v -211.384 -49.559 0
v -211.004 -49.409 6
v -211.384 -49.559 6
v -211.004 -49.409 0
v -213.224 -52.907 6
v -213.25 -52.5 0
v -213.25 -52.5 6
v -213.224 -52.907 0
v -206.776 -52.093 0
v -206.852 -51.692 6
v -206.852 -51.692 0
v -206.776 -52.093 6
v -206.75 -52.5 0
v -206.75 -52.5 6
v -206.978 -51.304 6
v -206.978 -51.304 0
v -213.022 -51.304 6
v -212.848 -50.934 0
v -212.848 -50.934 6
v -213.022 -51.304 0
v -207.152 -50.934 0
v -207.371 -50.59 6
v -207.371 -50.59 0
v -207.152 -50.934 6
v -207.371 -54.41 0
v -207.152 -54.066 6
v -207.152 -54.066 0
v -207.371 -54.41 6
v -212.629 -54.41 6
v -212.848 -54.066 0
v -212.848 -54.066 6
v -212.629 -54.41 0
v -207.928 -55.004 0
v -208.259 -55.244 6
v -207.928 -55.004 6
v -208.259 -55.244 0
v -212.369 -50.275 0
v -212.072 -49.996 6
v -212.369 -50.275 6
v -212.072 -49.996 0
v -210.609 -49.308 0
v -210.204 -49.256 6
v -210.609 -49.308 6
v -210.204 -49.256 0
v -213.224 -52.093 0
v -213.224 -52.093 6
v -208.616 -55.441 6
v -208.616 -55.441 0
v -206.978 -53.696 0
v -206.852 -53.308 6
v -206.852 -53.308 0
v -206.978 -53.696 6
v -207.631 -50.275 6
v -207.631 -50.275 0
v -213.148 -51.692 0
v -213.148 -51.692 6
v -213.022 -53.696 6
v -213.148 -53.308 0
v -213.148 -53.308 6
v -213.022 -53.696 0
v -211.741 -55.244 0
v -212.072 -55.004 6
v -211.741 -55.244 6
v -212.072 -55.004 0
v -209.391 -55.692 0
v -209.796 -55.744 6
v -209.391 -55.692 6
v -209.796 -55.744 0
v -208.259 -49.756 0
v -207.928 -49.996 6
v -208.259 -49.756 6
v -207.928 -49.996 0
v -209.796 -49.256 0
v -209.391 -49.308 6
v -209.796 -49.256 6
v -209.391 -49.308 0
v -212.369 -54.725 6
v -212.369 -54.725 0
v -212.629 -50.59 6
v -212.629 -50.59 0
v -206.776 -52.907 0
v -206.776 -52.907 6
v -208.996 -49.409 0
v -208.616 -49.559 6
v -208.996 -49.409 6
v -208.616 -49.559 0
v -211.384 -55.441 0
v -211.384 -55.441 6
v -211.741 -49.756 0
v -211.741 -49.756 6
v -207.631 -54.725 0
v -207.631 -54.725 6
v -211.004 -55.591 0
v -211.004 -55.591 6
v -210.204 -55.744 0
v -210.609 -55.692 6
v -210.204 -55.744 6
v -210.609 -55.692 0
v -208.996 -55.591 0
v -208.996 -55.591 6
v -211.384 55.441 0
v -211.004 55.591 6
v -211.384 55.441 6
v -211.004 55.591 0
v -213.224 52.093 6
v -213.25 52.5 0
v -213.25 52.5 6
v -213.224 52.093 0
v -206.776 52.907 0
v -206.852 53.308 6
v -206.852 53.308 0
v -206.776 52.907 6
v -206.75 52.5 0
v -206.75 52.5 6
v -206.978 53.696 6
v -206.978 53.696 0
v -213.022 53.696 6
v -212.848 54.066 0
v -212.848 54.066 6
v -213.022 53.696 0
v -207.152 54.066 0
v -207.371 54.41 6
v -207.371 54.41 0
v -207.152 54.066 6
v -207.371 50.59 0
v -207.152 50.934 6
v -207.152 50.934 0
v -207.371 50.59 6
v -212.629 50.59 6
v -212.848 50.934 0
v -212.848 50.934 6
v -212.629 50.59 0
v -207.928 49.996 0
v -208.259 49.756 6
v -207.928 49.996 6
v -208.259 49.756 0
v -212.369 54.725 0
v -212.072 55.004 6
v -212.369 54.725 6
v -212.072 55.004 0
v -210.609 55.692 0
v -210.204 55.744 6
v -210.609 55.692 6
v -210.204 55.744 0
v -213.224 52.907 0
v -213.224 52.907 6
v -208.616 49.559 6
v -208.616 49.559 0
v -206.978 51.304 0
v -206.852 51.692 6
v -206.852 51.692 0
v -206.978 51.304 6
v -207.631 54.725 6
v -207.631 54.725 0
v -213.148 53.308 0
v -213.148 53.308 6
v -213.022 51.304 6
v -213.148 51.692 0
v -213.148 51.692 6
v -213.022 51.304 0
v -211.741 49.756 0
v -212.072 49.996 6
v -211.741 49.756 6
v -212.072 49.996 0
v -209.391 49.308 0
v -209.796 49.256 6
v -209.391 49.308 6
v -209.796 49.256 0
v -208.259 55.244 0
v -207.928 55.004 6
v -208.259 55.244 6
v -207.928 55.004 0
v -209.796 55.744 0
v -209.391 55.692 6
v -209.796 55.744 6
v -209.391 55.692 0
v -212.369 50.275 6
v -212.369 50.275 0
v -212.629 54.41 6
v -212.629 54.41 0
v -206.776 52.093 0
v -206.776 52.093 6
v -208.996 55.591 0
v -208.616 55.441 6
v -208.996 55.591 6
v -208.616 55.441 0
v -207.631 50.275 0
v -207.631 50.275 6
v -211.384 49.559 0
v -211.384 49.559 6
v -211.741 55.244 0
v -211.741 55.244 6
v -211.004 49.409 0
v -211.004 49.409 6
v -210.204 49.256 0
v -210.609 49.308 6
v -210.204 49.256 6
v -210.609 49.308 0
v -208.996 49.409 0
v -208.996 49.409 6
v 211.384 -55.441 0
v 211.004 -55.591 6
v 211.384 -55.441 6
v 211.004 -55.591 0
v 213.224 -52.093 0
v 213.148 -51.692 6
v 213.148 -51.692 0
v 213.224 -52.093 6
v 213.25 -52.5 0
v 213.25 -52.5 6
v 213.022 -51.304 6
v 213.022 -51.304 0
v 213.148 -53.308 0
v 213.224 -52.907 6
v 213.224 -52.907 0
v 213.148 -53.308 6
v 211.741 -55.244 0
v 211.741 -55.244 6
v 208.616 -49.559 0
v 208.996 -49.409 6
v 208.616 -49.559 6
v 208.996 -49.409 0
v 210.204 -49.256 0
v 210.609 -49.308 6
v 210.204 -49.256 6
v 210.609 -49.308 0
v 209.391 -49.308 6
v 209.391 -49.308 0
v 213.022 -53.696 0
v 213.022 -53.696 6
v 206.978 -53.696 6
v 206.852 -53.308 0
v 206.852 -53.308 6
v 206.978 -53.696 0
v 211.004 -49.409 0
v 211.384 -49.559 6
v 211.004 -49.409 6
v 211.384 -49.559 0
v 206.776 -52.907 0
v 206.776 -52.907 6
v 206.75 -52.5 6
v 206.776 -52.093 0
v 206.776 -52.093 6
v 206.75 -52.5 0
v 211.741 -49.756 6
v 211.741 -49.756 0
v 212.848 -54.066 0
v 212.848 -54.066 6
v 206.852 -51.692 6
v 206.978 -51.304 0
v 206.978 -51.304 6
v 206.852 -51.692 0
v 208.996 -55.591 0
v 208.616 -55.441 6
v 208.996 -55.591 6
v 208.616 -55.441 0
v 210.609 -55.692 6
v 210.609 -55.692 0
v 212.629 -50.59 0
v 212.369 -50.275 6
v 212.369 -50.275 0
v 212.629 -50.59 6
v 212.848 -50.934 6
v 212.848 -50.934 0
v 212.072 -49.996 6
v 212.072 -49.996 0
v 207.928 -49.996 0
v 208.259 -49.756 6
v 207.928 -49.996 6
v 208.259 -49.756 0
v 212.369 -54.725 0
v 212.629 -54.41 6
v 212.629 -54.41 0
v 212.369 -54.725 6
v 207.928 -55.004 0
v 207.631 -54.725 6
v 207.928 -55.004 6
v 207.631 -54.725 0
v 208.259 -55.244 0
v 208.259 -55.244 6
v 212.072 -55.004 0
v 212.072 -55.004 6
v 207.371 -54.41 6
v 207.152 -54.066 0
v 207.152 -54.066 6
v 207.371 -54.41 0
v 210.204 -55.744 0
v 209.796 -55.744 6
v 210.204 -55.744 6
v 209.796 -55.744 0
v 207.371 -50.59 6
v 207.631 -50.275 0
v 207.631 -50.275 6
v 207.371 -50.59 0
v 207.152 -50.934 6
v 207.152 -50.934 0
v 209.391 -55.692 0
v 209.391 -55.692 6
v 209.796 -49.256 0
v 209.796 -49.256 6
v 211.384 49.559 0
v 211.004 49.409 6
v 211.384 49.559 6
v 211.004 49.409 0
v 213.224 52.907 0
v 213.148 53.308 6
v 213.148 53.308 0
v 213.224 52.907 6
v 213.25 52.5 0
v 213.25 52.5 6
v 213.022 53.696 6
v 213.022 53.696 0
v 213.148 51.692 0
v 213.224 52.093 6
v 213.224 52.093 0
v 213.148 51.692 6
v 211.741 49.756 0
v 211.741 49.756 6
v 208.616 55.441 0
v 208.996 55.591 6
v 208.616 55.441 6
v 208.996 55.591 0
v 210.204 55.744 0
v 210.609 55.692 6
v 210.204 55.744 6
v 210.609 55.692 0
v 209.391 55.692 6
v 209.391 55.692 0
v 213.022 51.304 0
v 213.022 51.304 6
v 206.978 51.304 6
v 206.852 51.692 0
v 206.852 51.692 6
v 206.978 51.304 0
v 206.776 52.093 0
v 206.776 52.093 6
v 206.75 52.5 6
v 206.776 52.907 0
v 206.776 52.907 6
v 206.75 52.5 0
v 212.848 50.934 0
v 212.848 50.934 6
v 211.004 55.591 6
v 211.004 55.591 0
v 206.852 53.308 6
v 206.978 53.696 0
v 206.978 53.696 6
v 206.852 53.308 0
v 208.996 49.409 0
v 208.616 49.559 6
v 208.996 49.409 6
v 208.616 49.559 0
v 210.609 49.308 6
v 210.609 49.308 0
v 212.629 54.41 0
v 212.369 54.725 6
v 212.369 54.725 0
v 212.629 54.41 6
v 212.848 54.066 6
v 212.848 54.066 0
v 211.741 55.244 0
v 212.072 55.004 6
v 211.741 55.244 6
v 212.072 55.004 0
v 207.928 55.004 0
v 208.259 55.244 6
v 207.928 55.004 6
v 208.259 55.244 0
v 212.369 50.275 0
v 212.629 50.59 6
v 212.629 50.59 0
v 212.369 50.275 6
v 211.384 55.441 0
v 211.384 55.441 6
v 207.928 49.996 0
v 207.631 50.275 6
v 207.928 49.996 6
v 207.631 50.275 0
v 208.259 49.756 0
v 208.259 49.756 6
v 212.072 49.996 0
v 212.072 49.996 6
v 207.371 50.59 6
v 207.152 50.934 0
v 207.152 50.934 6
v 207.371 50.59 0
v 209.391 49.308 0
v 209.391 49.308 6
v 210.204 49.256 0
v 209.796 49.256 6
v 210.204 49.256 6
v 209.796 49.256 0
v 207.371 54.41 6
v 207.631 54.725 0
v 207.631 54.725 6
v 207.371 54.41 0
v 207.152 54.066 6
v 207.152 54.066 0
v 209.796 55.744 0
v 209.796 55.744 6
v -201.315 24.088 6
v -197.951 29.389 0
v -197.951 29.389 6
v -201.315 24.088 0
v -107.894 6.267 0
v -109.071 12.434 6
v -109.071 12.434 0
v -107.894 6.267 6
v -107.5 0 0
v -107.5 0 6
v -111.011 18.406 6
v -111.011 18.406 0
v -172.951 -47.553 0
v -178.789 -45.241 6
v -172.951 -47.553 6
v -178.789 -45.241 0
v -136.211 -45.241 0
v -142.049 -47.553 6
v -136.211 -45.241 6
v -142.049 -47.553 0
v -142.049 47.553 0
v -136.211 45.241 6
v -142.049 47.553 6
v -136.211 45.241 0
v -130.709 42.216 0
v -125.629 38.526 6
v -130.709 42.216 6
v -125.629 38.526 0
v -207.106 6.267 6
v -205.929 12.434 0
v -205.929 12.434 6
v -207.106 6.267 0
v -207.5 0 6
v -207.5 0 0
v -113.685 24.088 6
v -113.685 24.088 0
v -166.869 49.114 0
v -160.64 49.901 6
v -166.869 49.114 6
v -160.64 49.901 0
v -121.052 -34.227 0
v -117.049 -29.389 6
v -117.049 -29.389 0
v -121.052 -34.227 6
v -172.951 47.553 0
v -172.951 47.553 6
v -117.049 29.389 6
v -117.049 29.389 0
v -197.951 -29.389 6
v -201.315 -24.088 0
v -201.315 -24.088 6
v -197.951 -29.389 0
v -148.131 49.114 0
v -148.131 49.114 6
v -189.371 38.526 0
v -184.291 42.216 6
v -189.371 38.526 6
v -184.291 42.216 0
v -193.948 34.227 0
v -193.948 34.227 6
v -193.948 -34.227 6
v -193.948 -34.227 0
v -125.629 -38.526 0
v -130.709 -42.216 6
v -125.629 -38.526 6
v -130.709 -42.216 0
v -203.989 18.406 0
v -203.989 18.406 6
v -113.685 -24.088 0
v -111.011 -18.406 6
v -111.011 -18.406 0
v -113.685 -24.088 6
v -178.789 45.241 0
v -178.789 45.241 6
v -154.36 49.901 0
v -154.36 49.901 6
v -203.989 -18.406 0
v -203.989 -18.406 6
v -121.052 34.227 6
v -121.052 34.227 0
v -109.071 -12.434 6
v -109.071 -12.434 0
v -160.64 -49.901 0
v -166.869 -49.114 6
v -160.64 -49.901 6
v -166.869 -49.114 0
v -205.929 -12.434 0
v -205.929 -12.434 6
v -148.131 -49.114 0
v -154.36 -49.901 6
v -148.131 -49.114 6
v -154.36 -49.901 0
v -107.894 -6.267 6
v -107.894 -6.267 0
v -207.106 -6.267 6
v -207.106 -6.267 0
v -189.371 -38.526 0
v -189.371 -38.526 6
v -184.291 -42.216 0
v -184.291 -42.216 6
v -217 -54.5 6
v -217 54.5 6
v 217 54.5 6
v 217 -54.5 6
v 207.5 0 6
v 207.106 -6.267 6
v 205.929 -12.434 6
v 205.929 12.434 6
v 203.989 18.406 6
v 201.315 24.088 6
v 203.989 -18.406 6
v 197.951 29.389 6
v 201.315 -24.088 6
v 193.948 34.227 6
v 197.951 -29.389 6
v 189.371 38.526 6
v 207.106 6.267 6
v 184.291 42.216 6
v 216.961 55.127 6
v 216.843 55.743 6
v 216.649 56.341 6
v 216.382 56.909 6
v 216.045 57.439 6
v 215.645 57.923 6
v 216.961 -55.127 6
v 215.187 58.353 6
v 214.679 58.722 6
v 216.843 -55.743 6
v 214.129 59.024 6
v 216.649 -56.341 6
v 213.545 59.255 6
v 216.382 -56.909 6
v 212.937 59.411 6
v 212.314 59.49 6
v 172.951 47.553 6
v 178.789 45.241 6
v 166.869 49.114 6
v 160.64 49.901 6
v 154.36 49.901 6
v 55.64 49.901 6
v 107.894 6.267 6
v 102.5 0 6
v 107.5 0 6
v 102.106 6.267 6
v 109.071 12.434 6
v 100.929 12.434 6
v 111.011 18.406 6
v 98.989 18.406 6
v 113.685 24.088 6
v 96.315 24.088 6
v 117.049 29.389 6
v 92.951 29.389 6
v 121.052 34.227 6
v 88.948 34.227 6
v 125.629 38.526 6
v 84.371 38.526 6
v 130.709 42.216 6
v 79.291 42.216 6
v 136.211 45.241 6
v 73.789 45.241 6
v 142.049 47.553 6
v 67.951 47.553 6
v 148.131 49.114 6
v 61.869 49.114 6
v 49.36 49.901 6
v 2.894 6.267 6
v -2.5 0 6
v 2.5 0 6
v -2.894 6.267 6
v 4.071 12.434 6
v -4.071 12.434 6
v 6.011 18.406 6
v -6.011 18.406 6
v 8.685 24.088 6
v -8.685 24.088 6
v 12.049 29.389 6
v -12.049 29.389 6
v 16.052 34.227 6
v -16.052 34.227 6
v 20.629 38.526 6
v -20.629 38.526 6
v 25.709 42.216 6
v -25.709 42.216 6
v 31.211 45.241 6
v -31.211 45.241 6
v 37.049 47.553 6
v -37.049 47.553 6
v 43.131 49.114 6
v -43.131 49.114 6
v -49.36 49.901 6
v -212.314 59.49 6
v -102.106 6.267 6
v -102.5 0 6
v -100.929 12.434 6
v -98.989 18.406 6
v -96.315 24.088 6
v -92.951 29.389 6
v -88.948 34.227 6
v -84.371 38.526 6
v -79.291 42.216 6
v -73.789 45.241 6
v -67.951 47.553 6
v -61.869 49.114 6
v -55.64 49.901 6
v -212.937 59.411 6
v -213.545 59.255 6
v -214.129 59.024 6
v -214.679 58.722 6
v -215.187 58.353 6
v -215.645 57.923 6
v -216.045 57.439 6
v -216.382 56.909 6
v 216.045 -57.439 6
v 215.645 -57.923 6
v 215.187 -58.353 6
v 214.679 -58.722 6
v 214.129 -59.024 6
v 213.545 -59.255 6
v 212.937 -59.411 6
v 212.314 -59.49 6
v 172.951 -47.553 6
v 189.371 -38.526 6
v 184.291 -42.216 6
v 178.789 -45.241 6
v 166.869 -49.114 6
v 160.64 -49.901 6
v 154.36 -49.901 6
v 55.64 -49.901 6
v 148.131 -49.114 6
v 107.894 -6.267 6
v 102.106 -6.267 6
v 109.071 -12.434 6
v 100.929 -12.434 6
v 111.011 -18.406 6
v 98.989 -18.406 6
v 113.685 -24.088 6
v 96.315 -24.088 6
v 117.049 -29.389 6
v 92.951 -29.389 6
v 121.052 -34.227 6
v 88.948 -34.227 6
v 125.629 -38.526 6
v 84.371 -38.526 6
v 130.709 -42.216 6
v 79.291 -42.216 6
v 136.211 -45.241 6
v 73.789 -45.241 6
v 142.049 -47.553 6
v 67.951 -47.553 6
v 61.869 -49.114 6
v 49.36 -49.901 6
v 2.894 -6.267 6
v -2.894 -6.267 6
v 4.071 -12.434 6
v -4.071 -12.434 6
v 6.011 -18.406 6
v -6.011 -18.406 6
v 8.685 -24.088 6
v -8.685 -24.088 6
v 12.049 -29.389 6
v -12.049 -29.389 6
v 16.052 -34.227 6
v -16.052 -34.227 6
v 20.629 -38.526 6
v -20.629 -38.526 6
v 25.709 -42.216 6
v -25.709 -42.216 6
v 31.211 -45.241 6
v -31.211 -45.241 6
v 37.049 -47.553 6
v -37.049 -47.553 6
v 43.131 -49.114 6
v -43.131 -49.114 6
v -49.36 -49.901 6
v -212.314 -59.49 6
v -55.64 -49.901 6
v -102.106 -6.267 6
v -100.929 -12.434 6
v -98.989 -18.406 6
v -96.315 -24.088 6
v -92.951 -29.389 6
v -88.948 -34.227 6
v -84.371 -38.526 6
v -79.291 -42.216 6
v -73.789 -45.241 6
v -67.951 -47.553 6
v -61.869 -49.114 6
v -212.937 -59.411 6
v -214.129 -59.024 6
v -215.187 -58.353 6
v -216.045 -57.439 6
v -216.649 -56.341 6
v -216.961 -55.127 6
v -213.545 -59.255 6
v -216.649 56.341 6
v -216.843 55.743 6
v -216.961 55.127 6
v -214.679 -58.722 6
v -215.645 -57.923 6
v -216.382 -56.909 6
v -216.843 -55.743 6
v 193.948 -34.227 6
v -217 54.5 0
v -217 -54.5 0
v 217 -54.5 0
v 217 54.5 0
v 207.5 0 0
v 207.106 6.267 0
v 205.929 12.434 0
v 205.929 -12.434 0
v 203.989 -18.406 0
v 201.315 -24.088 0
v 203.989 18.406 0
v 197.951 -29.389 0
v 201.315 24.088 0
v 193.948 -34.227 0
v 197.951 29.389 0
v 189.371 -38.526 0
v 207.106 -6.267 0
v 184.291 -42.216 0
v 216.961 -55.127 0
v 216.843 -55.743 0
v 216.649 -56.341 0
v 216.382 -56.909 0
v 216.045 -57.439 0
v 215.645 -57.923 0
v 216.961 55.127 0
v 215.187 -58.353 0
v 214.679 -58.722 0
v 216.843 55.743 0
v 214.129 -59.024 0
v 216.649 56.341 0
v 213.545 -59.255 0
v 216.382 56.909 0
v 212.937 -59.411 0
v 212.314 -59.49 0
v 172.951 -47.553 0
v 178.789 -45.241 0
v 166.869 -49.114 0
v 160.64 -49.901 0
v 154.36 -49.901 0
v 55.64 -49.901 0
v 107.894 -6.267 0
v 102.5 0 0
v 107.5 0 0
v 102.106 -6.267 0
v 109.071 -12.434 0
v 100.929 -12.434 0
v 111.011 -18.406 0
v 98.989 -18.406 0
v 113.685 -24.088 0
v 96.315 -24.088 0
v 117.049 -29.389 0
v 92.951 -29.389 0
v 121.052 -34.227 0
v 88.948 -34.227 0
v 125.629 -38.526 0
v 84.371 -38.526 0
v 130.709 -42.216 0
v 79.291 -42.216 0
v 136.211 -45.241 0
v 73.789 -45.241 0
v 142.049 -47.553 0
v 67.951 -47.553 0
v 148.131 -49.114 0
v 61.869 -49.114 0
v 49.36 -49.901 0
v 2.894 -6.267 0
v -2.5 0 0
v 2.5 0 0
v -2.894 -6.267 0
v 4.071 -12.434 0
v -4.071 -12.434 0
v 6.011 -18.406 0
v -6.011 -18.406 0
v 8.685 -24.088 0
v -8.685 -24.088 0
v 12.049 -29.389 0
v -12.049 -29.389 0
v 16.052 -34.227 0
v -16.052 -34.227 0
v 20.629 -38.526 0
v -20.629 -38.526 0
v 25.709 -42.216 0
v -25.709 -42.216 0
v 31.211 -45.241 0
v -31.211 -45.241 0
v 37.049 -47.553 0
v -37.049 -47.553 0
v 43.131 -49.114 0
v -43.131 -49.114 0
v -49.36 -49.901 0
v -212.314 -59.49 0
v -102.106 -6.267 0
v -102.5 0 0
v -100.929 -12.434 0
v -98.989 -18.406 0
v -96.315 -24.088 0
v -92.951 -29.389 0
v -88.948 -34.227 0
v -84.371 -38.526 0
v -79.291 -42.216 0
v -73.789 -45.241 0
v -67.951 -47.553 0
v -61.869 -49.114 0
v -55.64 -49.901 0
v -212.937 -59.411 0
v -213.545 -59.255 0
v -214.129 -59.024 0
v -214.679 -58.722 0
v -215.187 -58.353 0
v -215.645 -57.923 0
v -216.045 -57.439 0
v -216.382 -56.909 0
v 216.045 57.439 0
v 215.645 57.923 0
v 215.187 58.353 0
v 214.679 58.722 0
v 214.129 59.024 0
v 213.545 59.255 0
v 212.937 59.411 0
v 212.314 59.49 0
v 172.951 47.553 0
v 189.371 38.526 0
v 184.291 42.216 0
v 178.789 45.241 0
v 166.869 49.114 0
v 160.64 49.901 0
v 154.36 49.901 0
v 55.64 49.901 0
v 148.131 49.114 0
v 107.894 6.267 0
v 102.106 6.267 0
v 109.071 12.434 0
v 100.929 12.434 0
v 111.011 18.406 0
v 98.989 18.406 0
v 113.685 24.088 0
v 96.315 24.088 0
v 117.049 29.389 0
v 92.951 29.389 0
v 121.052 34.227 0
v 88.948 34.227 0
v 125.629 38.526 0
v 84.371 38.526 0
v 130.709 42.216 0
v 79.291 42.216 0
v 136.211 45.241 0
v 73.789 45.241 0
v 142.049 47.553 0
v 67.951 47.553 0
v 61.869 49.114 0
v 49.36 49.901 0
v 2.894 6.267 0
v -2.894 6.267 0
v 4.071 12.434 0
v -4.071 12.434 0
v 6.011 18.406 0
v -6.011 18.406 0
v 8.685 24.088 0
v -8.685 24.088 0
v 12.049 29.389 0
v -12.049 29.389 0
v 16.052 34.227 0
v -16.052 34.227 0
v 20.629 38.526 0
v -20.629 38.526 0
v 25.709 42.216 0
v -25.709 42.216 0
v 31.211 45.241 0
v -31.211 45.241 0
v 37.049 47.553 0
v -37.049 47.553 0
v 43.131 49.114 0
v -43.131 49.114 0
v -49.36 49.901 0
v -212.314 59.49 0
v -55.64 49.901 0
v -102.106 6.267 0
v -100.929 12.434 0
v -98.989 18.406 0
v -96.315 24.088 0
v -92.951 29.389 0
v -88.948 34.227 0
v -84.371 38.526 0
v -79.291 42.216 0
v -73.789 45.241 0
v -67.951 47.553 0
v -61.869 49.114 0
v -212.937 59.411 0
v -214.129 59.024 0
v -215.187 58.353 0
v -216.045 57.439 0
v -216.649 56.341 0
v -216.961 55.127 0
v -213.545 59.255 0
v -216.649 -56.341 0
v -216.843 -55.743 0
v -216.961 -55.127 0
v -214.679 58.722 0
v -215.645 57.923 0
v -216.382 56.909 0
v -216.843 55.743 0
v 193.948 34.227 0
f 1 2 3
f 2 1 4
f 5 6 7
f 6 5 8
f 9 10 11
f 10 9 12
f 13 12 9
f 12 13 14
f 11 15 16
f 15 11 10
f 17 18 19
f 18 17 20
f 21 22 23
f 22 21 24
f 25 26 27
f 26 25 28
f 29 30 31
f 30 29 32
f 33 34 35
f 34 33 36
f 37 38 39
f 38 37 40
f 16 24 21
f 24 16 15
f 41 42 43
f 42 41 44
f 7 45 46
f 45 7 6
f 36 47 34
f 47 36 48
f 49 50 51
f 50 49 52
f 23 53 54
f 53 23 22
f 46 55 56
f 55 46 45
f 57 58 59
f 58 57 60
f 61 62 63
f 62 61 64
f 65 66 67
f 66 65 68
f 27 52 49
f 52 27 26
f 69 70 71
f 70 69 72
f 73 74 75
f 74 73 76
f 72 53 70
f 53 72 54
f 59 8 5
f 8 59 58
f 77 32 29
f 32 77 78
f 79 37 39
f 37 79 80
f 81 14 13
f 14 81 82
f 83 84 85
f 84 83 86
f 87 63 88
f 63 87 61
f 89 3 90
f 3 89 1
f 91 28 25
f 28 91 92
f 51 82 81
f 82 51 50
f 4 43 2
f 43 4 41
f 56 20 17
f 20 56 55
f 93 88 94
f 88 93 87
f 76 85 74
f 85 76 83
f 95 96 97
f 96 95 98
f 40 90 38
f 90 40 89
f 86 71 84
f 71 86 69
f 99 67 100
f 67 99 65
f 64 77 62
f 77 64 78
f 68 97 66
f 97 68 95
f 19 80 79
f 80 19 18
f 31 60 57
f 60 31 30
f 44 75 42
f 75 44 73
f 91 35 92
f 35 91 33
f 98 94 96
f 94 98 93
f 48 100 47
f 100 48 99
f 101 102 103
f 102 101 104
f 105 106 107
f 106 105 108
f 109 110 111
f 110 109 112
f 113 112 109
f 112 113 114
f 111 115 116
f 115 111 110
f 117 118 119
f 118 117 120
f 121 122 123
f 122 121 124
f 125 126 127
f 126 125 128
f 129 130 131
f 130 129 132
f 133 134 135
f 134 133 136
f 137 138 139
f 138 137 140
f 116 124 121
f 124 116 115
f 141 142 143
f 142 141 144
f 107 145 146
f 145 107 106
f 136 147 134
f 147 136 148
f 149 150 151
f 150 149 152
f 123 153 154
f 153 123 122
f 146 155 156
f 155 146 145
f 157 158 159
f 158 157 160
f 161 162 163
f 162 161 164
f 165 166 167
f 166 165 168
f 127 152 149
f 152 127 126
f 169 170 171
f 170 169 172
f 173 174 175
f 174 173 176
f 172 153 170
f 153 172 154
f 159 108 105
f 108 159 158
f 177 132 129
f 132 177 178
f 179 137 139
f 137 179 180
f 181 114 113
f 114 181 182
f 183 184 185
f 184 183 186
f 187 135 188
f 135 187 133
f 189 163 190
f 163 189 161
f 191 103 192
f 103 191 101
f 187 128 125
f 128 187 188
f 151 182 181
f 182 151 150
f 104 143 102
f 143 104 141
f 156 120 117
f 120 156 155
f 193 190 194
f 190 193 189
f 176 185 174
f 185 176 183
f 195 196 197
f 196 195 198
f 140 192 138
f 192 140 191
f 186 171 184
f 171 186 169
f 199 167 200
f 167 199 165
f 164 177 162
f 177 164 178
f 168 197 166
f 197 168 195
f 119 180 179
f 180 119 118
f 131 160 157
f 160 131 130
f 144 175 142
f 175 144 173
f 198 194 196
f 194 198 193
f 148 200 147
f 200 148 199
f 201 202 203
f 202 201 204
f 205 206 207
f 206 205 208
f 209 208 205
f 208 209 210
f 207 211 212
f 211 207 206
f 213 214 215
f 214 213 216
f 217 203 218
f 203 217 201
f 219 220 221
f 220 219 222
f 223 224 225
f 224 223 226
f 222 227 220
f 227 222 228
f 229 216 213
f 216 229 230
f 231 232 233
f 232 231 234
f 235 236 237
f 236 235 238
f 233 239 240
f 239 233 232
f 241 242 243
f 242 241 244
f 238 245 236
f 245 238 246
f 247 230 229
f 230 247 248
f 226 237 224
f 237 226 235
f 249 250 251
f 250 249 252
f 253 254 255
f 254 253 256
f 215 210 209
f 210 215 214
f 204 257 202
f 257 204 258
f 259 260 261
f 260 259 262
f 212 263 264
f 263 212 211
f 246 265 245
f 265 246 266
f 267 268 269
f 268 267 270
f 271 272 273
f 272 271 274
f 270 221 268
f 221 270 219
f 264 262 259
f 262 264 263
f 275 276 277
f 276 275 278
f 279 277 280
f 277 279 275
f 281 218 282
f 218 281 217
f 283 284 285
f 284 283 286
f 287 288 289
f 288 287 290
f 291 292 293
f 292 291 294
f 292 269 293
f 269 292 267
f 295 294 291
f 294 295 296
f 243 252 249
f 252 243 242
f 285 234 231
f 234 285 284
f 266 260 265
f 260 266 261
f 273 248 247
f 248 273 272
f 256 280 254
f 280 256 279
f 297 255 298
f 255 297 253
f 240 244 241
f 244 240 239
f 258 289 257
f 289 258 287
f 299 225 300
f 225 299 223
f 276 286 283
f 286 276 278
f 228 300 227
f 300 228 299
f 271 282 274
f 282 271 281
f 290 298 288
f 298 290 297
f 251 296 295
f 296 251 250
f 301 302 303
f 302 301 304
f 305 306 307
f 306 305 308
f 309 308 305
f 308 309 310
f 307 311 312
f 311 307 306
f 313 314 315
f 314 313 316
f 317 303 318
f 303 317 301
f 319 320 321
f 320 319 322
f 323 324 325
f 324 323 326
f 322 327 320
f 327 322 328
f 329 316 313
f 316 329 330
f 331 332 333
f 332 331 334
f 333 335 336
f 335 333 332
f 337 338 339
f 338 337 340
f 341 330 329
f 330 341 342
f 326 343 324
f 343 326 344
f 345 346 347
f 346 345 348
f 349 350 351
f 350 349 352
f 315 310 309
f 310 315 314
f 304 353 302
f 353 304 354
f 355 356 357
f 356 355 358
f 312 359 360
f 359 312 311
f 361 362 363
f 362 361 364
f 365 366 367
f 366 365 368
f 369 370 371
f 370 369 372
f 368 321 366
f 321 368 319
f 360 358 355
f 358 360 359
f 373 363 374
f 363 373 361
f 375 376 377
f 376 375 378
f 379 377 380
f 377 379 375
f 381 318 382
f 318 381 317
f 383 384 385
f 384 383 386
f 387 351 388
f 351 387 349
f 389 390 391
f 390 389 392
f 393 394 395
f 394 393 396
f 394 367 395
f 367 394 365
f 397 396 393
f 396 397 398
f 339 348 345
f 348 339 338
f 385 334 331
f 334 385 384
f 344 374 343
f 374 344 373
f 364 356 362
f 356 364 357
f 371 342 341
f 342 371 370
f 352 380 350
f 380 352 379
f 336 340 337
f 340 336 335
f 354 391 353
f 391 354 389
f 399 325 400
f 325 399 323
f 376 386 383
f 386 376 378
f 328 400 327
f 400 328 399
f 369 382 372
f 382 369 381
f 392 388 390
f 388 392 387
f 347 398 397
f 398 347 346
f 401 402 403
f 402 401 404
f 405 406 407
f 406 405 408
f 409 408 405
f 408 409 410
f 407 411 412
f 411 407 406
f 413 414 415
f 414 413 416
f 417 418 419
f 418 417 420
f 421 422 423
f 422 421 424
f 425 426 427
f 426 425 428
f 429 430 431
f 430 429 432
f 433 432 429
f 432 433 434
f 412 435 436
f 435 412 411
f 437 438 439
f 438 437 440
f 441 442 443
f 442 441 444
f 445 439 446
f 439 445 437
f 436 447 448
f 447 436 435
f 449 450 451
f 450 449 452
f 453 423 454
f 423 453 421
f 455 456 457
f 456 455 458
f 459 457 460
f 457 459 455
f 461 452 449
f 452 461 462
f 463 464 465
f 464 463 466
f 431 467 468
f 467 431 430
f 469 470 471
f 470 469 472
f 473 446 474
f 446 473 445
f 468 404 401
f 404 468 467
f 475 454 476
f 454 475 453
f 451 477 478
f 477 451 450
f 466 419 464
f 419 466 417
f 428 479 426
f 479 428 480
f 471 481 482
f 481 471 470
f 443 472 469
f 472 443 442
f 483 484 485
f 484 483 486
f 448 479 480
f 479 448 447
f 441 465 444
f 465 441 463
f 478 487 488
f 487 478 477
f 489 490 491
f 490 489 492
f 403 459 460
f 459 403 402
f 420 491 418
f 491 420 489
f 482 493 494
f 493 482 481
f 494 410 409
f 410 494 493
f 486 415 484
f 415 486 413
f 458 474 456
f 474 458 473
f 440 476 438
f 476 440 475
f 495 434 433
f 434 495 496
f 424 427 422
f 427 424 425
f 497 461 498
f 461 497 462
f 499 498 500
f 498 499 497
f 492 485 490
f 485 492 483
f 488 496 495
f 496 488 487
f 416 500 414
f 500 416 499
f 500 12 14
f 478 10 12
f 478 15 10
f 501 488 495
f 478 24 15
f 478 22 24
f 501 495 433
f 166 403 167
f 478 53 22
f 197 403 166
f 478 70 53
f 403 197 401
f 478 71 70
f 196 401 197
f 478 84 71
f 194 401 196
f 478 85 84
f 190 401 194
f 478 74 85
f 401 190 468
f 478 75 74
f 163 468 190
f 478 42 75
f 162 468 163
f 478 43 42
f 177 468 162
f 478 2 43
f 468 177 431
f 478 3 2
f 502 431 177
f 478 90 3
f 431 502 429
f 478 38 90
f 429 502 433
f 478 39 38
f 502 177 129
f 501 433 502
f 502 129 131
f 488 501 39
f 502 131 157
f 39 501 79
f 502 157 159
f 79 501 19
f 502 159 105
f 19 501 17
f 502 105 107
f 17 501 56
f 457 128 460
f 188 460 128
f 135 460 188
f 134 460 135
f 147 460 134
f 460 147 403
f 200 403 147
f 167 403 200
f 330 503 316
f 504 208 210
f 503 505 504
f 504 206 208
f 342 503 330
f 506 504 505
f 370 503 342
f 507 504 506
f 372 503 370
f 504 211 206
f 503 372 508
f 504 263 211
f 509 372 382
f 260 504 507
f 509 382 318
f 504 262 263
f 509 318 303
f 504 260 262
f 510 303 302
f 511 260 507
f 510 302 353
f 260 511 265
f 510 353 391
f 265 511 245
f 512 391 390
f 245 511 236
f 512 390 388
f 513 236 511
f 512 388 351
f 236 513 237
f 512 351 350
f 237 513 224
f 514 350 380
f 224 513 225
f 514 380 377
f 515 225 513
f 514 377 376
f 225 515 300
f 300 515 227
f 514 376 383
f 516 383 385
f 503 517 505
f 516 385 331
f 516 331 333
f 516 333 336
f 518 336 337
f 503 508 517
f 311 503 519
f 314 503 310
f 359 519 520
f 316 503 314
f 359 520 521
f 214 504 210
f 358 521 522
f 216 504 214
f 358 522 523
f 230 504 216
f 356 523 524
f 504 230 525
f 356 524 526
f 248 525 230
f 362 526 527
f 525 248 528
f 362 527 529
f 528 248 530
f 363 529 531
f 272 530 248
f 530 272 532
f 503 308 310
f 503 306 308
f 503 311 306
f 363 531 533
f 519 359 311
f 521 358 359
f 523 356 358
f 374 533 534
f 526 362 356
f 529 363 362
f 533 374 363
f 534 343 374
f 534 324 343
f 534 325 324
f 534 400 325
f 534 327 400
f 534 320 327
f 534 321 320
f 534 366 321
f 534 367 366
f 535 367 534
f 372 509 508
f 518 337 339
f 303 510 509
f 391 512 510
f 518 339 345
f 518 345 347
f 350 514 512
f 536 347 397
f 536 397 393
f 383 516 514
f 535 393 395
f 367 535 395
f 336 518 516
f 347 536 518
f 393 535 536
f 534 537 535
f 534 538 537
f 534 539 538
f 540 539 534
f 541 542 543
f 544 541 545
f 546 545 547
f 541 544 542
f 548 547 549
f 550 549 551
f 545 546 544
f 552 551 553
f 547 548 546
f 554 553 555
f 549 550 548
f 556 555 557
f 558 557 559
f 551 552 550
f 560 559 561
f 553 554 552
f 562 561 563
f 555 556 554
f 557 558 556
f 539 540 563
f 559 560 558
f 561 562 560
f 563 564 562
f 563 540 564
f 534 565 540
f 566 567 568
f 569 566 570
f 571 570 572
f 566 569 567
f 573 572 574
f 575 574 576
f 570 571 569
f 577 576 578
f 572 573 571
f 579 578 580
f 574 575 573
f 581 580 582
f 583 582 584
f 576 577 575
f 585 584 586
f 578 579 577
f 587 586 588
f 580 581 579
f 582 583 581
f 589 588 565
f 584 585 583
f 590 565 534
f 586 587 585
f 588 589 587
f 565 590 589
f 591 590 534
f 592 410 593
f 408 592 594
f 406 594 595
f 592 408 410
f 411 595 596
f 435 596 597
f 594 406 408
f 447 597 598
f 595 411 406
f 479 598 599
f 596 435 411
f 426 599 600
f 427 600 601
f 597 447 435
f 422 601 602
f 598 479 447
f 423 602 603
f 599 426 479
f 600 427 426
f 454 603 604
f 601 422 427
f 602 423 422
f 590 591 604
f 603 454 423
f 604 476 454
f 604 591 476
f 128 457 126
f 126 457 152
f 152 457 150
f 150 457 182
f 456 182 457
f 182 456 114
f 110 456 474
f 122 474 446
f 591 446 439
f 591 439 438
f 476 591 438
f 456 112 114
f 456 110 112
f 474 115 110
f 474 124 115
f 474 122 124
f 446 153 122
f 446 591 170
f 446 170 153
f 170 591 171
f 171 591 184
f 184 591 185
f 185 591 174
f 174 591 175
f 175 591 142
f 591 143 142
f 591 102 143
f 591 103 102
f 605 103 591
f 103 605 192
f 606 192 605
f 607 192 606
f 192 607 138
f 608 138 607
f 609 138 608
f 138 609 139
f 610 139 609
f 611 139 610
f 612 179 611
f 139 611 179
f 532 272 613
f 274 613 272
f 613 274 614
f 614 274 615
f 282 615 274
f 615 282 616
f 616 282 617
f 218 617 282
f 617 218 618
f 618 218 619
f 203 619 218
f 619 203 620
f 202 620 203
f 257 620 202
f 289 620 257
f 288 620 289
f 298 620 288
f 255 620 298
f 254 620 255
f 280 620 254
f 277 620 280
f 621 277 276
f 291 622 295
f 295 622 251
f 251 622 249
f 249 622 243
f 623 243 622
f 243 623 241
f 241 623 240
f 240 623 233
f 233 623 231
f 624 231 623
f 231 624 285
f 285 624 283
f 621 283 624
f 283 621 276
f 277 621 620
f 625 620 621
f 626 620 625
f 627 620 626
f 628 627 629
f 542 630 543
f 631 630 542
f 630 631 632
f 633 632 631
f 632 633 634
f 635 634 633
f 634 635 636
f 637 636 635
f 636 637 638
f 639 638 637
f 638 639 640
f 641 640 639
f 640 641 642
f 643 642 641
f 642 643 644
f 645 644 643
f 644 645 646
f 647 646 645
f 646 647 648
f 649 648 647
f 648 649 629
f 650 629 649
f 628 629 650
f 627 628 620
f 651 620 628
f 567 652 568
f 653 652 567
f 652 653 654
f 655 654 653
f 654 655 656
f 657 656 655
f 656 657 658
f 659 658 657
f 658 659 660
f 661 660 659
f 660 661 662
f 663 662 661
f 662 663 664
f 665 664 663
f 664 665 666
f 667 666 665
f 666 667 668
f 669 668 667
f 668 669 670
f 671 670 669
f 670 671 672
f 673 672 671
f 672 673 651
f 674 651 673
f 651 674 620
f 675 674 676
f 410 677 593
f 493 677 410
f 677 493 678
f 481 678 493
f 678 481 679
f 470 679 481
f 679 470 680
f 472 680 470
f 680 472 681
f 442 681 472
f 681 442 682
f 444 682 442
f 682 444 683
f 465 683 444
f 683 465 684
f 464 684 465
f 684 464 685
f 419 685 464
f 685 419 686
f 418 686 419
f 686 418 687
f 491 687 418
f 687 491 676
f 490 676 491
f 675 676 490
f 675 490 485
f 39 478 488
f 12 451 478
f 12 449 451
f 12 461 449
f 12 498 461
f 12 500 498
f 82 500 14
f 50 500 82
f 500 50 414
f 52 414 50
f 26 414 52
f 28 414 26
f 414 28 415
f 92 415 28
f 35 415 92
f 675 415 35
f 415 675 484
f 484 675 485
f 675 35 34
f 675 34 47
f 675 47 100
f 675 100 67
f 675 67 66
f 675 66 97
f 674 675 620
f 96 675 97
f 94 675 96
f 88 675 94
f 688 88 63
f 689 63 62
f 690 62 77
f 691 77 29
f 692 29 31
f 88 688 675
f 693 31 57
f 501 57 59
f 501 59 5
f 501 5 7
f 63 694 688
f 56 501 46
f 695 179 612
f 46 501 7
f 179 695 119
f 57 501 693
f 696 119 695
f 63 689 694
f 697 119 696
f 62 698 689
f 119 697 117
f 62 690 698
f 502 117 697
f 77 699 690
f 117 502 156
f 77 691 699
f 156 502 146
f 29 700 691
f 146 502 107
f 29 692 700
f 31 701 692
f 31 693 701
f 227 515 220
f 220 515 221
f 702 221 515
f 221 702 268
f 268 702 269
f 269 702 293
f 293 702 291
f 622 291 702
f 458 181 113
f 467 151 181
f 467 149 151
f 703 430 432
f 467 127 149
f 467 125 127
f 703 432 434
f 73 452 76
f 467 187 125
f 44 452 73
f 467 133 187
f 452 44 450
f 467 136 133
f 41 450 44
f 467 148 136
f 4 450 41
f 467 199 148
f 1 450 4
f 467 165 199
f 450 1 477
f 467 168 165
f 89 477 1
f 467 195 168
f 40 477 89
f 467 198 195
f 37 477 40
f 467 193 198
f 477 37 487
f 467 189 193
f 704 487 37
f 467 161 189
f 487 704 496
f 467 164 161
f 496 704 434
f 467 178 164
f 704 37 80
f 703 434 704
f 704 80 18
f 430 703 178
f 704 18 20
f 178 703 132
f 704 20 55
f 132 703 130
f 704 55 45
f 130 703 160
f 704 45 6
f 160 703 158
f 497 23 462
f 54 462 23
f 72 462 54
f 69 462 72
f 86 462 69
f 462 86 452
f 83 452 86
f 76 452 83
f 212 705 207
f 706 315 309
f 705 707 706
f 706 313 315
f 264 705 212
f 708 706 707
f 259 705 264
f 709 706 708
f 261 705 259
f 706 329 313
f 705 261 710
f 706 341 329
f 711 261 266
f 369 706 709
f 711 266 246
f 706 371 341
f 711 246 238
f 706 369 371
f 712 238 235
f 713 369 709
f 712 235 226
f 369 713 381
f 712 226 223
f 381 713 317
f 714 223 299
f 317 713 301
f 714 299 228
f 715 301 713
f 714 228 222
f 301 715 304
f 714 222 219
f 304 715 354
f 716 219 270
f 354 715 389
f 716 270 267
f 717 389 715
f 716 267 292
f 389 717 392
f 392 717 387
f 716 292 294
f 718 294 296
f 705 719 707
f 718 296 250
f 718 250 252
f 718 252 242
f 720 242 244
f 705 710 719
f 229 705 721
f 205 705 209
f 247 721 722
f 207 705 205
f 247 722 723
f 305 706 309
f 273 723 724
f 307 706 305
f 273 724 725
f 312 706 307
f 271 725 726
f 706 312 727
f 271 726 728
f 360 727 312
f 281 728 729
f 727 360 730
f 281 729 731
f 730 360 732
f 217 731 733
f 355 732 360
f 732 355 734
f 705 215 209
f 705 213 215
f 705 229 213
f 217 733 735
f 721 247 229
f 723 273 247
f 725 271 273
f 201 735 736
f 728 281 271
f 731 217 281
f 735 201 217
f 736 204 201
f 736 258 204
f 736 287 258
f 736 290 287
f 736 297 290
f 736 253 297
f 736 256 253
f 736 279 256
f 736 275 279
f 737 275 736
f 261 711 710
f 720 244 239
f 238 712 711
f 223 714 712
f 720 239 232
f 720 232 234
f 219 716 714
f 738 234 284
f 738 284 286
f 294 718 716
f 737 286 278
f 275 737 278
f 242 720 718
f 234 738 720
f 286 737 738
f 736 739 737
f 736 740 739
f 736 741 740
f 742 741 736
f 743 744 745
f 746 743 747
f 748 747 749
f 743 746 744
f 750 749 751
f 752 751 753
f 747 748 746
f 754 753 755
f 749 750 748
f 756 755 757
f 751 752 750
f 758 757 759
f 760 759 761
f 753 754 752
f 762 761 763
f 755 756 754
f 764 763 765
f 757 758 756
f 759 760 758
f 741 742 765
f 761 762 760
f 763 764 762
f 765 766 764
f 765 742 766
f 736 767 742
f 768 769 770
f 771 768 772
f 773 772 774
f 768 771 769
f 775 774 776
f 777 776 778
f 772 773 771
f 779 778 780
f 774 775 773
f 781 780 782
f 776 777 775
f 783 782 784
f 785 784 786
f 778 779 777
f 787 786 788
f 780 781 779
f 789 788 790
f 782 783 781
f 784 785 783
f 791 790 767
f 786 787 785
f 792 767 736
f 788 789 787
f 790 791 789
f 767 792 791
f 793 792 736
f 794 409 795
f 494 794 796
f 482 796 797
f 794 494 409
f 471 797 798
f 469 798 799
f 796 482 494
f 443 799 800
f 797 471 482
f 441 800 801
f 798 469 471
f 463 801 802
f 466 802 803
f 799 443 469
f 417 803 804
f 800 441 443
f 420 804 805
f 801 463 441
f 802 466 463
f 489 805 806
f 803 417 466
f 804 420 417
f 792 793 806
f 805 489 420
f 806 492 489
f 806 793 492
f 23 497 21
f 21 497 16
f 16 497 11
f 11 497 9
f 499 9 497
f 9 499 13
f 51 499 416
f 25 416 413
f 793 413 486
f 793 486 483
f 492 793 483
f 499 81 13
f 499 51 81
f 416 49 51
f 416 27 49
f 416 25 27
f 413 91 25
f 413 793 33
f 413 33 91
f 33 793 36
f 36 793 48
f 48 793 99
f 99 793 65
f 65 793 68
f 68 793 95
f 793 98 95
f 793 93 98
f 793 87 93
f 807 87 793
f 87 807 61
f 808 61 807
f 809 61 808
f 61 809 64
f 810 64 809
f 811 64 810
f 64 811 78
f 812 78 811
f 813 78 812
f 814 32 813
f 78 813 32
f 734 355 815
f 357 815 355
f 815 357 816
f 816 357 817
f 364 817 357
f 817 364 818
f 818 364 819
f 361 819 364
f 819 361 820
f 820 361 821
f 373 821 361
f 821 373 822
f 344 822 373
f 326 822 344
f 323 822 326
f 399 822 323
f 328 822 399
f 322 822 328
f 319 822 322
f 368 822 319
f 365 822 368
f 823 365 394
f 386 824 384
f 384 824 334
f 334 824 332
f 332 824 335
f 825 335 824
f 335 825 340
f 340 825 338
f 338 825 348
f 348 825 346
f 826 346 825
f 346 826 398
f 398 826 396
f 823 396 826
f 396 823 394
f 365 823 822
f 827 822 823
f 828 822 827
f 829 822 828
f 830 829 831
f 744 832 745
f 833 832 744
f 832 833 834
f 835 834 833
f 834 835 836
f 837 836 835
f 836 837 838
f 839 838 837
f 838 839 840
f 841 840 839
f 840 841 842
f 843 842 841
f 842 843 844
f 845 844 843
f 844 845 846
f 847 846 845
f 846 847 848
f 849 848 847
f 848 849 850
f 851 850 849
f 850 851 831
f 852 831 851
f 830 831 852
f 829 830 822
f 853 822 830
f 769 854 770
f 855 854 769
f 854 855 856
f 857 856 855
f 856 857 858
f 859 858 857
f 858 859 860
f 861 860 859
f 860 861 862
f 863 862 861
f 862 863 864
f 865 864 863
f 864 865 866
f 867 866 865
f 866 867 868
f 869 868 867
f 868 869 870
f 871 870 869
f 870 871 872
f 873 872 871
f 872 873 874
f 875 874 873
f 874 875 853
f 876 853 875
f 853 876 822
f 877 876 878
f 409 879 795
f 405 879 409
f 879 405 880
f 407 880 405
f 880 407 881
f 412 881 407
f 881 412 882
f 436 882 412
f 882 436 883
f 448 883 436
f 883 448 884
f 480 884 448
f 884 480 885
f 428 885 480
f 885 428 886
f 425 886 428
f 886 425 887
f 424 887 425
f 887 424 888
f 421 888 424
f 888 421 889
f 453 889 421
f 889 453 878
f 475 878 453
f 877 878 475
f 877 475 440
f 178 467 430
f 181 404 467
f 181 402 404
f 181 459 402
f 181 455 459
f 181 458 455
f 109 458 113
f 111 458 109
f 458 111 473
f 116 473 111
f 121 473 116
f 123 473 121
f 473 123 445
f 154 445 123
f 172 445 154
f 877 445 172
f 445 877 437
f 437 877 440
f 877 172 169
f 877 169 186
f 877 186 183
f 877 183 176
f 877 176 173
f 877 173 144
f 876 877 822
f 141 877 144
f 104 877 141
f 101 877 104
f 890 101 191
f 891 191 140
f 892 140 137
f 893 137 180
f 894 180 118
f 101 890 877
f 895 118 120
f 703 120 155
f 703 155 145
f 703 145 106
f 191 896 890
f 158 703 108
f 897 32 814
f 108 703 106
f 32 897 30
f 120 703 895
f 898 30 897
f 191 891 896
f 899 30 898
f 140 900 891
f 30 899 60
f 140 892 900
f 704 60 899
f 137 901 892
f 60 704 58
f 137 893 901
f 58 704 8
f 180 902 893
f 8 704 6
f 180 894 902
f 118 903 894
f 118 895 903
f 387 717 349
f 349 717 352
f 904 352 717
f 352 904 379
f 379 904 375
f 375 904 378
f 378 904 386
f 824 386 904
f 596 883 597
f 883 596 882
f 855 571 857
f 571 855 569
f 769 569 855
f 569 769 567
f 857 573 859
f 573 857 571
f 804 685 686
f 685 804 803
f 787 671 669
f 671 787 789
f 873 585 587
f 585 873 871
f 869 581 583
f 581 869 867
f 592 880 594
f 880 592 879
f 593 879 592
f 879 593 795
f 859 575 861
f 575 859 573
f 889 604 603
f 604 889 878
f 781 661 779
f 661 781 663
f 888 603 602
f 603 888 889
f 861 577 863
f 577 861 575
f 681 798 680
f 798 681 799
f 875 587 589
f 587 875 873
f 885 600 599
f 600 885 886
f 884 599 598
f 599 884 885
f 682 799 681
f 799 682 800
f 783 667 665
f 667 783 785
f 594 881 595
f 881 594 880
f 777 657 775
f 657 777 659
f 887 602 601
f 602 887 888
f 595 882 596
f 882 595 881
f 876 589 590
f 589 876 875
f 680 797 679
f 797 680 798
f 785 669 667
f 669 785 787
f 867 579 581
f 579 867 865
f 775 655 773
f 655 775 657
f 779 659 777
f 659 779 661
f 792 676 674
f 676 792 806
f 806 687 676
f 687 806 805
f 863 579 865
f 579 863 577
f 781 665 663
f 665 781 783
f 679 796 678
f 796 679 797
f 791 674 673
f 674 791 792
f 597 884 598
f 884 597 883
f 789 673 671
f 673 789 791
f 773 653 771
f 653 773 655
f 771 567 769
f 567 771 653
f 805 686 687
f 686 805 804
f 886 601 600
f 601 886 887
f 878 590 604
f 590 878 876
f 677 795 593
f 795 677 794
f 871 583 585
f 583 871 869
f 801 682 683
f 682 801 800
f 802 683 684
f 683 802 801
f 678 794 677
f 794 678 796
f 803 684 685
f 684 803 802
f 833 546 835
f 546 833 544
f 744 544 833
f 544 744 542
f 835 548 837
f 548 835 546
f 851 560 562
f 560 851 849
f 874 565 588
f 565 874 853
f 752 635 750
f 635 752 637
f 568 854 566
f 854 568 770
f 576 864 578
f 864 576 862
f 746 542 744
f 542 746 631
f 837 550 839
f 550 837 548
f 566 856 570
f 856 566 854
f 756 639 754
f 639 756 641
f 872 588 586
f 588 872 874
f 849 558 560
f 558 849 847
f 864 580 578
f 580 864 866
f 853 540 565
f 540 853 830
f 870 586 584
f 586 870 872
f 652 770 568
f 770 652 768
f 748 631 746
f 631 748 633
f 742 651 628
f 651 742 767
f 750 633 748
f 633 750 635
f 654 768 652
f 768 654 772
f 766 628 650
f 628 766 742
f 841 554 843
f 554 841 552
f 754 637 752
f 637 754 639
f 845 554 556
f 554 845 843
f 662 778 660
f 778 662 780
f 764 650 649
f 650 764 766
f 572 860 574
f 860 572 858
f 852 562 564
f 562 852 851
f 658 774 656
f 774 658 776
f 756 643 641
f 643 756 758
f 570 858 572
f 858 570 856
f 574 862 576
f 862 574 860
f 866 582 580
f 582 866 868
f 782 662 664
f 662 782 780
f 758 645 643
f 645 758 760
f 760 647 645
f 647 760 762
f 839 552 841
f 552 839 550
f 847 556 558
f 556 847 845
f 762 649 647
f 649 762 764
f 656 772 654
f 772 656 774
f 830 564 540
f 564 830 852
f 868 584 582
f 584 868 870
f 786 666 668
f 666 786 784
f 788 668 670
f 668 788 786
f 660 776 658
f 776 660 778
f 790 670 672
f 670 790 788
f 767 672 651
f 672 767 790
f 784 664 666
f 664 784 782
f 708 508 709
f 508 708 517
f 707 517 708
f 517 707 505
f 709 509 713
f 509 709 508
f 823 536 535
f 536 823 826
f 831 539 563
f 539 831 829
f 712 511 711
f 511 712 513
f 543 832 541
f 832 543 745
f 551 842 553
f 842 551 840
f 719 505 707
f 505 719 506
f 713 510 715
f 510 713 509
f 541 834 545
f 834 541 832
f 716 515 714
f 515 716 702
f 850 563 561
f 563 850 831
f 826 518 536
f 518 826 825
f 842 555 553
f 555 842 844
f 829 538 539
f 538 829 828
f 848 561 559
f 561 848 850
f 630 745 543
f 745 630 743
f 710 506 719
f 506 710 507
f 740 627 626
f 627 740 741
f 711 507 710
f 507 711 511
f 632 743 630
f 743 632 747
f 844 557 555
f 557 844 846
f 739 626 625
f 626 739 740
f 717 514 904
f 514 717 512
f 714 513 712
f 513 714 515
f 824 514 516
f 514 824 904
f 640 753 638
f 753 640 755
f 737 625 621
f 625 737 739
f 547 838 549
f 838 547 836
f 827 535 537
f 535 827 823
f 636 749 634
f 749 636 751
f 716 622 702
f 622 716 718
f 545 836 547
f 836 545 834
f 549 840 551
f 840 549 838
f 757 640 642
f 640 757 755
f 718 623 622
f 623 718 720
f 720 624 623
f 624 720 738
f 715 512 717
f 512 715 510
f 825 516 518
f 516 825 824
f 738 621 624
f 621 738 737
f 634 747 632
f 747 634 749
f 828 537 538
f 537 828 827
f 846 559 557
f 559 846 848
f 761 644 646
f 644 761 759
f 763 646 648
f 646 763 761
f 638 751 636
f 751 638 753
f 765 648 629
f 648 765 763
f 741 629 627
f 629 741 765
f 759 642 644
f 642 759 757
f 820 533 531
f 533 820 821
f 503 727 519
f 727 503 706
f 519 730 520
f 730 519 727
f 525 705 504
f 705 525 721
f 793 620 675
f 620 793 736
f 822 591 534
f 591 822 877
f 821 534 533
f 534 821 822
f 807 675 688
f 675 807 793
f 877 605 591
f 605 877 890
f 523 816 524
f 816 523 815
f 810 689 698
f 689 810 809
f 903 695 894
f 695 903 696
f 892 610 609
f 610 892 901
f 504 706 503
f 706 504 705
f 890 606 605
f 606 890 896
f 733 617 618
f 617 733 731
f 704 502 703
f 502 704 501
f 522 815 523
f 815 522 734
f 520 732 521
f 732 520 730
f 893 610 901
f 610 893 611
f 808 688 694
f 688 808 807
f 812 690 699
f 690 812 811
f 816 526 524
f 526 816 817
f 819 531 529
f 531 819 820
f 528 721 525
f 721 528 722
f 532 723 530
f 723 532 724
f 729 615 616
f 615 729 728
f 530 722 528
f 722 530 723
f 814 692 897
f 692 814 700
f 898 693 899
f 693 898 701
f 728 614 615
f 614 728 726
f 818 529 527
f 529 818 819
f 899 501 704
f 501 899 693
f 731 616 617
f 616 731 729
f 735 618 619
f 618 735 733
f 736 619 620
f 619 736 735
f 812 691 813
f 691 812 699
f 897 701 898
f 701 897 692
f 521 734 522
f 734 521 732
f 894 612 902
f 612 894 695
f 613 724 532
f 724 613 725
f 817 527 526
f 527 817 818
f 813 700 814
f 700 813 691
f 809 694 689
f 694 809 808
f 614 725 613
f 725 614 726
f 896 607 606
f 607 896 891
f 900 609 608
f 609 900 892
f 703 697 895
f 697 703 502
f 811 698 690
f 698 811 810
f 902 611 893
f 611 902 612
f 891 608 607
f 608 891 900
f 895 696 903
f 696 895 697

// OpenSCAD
$fn = 50;


difference() {
	union() {
		hull() {
			translate(v = [-212.0000000000, 54.5000000000, 0]) {
				cylinder(h = 6, r = 5);
			}
			translate(v = [212.0000000000, 54.5000000000, 0]) {
				cylinder(h = 6, r = 5);
			}
			translate(v = [-212.0000000000, -54.5000000000, 0]) {
				cylinder(h = 6, r = 5);
			}
			translate(v = [212.0000000000, -54.5000000000, 0]) {
				cylinder(h = 6, r = 5);
			}
		}
	}
	union() {
		#translate(v = [-210.0000000000, -52.5000000000, -100.0000000000]) {
			cylinder(h = 200, r = 3.2500000000);
		}
		#translate(v = [-210.0000000000, 52.5000000000, -100.0000000000]) {
			cylinder(h = 200, r = 3.2500000000);
		}
		#translate(v = [210.0000000000, -52.5000000000, -100.0000000000]) {
			cylinder(h = 200, r = 3.2500000000);
		}
		#translate(v = [210.0000000000, 52.5000000000, -100.0000000000]) {
			cylinder(h = 200, r = 3.2500000000);
		}
		#translate(v = [-157.5000000000, 0, 0]) {
			cylinder(h = 6, r = 50.0000000000);
		}
		#translate(v = [-52.5000000000, 0, 0]) {
			cylinder(h = 6, r = 50.0000000000);
		}
		#translate(v = [52.5000000000, 0, 0]) {
			cylinder(h = 6, r = 50.0000000000);
		}
		#translate(v = [157.5000000000, 0, 0]) {
			cylinder(h = 6, r = 50.0000000000);
		}
	}
}
